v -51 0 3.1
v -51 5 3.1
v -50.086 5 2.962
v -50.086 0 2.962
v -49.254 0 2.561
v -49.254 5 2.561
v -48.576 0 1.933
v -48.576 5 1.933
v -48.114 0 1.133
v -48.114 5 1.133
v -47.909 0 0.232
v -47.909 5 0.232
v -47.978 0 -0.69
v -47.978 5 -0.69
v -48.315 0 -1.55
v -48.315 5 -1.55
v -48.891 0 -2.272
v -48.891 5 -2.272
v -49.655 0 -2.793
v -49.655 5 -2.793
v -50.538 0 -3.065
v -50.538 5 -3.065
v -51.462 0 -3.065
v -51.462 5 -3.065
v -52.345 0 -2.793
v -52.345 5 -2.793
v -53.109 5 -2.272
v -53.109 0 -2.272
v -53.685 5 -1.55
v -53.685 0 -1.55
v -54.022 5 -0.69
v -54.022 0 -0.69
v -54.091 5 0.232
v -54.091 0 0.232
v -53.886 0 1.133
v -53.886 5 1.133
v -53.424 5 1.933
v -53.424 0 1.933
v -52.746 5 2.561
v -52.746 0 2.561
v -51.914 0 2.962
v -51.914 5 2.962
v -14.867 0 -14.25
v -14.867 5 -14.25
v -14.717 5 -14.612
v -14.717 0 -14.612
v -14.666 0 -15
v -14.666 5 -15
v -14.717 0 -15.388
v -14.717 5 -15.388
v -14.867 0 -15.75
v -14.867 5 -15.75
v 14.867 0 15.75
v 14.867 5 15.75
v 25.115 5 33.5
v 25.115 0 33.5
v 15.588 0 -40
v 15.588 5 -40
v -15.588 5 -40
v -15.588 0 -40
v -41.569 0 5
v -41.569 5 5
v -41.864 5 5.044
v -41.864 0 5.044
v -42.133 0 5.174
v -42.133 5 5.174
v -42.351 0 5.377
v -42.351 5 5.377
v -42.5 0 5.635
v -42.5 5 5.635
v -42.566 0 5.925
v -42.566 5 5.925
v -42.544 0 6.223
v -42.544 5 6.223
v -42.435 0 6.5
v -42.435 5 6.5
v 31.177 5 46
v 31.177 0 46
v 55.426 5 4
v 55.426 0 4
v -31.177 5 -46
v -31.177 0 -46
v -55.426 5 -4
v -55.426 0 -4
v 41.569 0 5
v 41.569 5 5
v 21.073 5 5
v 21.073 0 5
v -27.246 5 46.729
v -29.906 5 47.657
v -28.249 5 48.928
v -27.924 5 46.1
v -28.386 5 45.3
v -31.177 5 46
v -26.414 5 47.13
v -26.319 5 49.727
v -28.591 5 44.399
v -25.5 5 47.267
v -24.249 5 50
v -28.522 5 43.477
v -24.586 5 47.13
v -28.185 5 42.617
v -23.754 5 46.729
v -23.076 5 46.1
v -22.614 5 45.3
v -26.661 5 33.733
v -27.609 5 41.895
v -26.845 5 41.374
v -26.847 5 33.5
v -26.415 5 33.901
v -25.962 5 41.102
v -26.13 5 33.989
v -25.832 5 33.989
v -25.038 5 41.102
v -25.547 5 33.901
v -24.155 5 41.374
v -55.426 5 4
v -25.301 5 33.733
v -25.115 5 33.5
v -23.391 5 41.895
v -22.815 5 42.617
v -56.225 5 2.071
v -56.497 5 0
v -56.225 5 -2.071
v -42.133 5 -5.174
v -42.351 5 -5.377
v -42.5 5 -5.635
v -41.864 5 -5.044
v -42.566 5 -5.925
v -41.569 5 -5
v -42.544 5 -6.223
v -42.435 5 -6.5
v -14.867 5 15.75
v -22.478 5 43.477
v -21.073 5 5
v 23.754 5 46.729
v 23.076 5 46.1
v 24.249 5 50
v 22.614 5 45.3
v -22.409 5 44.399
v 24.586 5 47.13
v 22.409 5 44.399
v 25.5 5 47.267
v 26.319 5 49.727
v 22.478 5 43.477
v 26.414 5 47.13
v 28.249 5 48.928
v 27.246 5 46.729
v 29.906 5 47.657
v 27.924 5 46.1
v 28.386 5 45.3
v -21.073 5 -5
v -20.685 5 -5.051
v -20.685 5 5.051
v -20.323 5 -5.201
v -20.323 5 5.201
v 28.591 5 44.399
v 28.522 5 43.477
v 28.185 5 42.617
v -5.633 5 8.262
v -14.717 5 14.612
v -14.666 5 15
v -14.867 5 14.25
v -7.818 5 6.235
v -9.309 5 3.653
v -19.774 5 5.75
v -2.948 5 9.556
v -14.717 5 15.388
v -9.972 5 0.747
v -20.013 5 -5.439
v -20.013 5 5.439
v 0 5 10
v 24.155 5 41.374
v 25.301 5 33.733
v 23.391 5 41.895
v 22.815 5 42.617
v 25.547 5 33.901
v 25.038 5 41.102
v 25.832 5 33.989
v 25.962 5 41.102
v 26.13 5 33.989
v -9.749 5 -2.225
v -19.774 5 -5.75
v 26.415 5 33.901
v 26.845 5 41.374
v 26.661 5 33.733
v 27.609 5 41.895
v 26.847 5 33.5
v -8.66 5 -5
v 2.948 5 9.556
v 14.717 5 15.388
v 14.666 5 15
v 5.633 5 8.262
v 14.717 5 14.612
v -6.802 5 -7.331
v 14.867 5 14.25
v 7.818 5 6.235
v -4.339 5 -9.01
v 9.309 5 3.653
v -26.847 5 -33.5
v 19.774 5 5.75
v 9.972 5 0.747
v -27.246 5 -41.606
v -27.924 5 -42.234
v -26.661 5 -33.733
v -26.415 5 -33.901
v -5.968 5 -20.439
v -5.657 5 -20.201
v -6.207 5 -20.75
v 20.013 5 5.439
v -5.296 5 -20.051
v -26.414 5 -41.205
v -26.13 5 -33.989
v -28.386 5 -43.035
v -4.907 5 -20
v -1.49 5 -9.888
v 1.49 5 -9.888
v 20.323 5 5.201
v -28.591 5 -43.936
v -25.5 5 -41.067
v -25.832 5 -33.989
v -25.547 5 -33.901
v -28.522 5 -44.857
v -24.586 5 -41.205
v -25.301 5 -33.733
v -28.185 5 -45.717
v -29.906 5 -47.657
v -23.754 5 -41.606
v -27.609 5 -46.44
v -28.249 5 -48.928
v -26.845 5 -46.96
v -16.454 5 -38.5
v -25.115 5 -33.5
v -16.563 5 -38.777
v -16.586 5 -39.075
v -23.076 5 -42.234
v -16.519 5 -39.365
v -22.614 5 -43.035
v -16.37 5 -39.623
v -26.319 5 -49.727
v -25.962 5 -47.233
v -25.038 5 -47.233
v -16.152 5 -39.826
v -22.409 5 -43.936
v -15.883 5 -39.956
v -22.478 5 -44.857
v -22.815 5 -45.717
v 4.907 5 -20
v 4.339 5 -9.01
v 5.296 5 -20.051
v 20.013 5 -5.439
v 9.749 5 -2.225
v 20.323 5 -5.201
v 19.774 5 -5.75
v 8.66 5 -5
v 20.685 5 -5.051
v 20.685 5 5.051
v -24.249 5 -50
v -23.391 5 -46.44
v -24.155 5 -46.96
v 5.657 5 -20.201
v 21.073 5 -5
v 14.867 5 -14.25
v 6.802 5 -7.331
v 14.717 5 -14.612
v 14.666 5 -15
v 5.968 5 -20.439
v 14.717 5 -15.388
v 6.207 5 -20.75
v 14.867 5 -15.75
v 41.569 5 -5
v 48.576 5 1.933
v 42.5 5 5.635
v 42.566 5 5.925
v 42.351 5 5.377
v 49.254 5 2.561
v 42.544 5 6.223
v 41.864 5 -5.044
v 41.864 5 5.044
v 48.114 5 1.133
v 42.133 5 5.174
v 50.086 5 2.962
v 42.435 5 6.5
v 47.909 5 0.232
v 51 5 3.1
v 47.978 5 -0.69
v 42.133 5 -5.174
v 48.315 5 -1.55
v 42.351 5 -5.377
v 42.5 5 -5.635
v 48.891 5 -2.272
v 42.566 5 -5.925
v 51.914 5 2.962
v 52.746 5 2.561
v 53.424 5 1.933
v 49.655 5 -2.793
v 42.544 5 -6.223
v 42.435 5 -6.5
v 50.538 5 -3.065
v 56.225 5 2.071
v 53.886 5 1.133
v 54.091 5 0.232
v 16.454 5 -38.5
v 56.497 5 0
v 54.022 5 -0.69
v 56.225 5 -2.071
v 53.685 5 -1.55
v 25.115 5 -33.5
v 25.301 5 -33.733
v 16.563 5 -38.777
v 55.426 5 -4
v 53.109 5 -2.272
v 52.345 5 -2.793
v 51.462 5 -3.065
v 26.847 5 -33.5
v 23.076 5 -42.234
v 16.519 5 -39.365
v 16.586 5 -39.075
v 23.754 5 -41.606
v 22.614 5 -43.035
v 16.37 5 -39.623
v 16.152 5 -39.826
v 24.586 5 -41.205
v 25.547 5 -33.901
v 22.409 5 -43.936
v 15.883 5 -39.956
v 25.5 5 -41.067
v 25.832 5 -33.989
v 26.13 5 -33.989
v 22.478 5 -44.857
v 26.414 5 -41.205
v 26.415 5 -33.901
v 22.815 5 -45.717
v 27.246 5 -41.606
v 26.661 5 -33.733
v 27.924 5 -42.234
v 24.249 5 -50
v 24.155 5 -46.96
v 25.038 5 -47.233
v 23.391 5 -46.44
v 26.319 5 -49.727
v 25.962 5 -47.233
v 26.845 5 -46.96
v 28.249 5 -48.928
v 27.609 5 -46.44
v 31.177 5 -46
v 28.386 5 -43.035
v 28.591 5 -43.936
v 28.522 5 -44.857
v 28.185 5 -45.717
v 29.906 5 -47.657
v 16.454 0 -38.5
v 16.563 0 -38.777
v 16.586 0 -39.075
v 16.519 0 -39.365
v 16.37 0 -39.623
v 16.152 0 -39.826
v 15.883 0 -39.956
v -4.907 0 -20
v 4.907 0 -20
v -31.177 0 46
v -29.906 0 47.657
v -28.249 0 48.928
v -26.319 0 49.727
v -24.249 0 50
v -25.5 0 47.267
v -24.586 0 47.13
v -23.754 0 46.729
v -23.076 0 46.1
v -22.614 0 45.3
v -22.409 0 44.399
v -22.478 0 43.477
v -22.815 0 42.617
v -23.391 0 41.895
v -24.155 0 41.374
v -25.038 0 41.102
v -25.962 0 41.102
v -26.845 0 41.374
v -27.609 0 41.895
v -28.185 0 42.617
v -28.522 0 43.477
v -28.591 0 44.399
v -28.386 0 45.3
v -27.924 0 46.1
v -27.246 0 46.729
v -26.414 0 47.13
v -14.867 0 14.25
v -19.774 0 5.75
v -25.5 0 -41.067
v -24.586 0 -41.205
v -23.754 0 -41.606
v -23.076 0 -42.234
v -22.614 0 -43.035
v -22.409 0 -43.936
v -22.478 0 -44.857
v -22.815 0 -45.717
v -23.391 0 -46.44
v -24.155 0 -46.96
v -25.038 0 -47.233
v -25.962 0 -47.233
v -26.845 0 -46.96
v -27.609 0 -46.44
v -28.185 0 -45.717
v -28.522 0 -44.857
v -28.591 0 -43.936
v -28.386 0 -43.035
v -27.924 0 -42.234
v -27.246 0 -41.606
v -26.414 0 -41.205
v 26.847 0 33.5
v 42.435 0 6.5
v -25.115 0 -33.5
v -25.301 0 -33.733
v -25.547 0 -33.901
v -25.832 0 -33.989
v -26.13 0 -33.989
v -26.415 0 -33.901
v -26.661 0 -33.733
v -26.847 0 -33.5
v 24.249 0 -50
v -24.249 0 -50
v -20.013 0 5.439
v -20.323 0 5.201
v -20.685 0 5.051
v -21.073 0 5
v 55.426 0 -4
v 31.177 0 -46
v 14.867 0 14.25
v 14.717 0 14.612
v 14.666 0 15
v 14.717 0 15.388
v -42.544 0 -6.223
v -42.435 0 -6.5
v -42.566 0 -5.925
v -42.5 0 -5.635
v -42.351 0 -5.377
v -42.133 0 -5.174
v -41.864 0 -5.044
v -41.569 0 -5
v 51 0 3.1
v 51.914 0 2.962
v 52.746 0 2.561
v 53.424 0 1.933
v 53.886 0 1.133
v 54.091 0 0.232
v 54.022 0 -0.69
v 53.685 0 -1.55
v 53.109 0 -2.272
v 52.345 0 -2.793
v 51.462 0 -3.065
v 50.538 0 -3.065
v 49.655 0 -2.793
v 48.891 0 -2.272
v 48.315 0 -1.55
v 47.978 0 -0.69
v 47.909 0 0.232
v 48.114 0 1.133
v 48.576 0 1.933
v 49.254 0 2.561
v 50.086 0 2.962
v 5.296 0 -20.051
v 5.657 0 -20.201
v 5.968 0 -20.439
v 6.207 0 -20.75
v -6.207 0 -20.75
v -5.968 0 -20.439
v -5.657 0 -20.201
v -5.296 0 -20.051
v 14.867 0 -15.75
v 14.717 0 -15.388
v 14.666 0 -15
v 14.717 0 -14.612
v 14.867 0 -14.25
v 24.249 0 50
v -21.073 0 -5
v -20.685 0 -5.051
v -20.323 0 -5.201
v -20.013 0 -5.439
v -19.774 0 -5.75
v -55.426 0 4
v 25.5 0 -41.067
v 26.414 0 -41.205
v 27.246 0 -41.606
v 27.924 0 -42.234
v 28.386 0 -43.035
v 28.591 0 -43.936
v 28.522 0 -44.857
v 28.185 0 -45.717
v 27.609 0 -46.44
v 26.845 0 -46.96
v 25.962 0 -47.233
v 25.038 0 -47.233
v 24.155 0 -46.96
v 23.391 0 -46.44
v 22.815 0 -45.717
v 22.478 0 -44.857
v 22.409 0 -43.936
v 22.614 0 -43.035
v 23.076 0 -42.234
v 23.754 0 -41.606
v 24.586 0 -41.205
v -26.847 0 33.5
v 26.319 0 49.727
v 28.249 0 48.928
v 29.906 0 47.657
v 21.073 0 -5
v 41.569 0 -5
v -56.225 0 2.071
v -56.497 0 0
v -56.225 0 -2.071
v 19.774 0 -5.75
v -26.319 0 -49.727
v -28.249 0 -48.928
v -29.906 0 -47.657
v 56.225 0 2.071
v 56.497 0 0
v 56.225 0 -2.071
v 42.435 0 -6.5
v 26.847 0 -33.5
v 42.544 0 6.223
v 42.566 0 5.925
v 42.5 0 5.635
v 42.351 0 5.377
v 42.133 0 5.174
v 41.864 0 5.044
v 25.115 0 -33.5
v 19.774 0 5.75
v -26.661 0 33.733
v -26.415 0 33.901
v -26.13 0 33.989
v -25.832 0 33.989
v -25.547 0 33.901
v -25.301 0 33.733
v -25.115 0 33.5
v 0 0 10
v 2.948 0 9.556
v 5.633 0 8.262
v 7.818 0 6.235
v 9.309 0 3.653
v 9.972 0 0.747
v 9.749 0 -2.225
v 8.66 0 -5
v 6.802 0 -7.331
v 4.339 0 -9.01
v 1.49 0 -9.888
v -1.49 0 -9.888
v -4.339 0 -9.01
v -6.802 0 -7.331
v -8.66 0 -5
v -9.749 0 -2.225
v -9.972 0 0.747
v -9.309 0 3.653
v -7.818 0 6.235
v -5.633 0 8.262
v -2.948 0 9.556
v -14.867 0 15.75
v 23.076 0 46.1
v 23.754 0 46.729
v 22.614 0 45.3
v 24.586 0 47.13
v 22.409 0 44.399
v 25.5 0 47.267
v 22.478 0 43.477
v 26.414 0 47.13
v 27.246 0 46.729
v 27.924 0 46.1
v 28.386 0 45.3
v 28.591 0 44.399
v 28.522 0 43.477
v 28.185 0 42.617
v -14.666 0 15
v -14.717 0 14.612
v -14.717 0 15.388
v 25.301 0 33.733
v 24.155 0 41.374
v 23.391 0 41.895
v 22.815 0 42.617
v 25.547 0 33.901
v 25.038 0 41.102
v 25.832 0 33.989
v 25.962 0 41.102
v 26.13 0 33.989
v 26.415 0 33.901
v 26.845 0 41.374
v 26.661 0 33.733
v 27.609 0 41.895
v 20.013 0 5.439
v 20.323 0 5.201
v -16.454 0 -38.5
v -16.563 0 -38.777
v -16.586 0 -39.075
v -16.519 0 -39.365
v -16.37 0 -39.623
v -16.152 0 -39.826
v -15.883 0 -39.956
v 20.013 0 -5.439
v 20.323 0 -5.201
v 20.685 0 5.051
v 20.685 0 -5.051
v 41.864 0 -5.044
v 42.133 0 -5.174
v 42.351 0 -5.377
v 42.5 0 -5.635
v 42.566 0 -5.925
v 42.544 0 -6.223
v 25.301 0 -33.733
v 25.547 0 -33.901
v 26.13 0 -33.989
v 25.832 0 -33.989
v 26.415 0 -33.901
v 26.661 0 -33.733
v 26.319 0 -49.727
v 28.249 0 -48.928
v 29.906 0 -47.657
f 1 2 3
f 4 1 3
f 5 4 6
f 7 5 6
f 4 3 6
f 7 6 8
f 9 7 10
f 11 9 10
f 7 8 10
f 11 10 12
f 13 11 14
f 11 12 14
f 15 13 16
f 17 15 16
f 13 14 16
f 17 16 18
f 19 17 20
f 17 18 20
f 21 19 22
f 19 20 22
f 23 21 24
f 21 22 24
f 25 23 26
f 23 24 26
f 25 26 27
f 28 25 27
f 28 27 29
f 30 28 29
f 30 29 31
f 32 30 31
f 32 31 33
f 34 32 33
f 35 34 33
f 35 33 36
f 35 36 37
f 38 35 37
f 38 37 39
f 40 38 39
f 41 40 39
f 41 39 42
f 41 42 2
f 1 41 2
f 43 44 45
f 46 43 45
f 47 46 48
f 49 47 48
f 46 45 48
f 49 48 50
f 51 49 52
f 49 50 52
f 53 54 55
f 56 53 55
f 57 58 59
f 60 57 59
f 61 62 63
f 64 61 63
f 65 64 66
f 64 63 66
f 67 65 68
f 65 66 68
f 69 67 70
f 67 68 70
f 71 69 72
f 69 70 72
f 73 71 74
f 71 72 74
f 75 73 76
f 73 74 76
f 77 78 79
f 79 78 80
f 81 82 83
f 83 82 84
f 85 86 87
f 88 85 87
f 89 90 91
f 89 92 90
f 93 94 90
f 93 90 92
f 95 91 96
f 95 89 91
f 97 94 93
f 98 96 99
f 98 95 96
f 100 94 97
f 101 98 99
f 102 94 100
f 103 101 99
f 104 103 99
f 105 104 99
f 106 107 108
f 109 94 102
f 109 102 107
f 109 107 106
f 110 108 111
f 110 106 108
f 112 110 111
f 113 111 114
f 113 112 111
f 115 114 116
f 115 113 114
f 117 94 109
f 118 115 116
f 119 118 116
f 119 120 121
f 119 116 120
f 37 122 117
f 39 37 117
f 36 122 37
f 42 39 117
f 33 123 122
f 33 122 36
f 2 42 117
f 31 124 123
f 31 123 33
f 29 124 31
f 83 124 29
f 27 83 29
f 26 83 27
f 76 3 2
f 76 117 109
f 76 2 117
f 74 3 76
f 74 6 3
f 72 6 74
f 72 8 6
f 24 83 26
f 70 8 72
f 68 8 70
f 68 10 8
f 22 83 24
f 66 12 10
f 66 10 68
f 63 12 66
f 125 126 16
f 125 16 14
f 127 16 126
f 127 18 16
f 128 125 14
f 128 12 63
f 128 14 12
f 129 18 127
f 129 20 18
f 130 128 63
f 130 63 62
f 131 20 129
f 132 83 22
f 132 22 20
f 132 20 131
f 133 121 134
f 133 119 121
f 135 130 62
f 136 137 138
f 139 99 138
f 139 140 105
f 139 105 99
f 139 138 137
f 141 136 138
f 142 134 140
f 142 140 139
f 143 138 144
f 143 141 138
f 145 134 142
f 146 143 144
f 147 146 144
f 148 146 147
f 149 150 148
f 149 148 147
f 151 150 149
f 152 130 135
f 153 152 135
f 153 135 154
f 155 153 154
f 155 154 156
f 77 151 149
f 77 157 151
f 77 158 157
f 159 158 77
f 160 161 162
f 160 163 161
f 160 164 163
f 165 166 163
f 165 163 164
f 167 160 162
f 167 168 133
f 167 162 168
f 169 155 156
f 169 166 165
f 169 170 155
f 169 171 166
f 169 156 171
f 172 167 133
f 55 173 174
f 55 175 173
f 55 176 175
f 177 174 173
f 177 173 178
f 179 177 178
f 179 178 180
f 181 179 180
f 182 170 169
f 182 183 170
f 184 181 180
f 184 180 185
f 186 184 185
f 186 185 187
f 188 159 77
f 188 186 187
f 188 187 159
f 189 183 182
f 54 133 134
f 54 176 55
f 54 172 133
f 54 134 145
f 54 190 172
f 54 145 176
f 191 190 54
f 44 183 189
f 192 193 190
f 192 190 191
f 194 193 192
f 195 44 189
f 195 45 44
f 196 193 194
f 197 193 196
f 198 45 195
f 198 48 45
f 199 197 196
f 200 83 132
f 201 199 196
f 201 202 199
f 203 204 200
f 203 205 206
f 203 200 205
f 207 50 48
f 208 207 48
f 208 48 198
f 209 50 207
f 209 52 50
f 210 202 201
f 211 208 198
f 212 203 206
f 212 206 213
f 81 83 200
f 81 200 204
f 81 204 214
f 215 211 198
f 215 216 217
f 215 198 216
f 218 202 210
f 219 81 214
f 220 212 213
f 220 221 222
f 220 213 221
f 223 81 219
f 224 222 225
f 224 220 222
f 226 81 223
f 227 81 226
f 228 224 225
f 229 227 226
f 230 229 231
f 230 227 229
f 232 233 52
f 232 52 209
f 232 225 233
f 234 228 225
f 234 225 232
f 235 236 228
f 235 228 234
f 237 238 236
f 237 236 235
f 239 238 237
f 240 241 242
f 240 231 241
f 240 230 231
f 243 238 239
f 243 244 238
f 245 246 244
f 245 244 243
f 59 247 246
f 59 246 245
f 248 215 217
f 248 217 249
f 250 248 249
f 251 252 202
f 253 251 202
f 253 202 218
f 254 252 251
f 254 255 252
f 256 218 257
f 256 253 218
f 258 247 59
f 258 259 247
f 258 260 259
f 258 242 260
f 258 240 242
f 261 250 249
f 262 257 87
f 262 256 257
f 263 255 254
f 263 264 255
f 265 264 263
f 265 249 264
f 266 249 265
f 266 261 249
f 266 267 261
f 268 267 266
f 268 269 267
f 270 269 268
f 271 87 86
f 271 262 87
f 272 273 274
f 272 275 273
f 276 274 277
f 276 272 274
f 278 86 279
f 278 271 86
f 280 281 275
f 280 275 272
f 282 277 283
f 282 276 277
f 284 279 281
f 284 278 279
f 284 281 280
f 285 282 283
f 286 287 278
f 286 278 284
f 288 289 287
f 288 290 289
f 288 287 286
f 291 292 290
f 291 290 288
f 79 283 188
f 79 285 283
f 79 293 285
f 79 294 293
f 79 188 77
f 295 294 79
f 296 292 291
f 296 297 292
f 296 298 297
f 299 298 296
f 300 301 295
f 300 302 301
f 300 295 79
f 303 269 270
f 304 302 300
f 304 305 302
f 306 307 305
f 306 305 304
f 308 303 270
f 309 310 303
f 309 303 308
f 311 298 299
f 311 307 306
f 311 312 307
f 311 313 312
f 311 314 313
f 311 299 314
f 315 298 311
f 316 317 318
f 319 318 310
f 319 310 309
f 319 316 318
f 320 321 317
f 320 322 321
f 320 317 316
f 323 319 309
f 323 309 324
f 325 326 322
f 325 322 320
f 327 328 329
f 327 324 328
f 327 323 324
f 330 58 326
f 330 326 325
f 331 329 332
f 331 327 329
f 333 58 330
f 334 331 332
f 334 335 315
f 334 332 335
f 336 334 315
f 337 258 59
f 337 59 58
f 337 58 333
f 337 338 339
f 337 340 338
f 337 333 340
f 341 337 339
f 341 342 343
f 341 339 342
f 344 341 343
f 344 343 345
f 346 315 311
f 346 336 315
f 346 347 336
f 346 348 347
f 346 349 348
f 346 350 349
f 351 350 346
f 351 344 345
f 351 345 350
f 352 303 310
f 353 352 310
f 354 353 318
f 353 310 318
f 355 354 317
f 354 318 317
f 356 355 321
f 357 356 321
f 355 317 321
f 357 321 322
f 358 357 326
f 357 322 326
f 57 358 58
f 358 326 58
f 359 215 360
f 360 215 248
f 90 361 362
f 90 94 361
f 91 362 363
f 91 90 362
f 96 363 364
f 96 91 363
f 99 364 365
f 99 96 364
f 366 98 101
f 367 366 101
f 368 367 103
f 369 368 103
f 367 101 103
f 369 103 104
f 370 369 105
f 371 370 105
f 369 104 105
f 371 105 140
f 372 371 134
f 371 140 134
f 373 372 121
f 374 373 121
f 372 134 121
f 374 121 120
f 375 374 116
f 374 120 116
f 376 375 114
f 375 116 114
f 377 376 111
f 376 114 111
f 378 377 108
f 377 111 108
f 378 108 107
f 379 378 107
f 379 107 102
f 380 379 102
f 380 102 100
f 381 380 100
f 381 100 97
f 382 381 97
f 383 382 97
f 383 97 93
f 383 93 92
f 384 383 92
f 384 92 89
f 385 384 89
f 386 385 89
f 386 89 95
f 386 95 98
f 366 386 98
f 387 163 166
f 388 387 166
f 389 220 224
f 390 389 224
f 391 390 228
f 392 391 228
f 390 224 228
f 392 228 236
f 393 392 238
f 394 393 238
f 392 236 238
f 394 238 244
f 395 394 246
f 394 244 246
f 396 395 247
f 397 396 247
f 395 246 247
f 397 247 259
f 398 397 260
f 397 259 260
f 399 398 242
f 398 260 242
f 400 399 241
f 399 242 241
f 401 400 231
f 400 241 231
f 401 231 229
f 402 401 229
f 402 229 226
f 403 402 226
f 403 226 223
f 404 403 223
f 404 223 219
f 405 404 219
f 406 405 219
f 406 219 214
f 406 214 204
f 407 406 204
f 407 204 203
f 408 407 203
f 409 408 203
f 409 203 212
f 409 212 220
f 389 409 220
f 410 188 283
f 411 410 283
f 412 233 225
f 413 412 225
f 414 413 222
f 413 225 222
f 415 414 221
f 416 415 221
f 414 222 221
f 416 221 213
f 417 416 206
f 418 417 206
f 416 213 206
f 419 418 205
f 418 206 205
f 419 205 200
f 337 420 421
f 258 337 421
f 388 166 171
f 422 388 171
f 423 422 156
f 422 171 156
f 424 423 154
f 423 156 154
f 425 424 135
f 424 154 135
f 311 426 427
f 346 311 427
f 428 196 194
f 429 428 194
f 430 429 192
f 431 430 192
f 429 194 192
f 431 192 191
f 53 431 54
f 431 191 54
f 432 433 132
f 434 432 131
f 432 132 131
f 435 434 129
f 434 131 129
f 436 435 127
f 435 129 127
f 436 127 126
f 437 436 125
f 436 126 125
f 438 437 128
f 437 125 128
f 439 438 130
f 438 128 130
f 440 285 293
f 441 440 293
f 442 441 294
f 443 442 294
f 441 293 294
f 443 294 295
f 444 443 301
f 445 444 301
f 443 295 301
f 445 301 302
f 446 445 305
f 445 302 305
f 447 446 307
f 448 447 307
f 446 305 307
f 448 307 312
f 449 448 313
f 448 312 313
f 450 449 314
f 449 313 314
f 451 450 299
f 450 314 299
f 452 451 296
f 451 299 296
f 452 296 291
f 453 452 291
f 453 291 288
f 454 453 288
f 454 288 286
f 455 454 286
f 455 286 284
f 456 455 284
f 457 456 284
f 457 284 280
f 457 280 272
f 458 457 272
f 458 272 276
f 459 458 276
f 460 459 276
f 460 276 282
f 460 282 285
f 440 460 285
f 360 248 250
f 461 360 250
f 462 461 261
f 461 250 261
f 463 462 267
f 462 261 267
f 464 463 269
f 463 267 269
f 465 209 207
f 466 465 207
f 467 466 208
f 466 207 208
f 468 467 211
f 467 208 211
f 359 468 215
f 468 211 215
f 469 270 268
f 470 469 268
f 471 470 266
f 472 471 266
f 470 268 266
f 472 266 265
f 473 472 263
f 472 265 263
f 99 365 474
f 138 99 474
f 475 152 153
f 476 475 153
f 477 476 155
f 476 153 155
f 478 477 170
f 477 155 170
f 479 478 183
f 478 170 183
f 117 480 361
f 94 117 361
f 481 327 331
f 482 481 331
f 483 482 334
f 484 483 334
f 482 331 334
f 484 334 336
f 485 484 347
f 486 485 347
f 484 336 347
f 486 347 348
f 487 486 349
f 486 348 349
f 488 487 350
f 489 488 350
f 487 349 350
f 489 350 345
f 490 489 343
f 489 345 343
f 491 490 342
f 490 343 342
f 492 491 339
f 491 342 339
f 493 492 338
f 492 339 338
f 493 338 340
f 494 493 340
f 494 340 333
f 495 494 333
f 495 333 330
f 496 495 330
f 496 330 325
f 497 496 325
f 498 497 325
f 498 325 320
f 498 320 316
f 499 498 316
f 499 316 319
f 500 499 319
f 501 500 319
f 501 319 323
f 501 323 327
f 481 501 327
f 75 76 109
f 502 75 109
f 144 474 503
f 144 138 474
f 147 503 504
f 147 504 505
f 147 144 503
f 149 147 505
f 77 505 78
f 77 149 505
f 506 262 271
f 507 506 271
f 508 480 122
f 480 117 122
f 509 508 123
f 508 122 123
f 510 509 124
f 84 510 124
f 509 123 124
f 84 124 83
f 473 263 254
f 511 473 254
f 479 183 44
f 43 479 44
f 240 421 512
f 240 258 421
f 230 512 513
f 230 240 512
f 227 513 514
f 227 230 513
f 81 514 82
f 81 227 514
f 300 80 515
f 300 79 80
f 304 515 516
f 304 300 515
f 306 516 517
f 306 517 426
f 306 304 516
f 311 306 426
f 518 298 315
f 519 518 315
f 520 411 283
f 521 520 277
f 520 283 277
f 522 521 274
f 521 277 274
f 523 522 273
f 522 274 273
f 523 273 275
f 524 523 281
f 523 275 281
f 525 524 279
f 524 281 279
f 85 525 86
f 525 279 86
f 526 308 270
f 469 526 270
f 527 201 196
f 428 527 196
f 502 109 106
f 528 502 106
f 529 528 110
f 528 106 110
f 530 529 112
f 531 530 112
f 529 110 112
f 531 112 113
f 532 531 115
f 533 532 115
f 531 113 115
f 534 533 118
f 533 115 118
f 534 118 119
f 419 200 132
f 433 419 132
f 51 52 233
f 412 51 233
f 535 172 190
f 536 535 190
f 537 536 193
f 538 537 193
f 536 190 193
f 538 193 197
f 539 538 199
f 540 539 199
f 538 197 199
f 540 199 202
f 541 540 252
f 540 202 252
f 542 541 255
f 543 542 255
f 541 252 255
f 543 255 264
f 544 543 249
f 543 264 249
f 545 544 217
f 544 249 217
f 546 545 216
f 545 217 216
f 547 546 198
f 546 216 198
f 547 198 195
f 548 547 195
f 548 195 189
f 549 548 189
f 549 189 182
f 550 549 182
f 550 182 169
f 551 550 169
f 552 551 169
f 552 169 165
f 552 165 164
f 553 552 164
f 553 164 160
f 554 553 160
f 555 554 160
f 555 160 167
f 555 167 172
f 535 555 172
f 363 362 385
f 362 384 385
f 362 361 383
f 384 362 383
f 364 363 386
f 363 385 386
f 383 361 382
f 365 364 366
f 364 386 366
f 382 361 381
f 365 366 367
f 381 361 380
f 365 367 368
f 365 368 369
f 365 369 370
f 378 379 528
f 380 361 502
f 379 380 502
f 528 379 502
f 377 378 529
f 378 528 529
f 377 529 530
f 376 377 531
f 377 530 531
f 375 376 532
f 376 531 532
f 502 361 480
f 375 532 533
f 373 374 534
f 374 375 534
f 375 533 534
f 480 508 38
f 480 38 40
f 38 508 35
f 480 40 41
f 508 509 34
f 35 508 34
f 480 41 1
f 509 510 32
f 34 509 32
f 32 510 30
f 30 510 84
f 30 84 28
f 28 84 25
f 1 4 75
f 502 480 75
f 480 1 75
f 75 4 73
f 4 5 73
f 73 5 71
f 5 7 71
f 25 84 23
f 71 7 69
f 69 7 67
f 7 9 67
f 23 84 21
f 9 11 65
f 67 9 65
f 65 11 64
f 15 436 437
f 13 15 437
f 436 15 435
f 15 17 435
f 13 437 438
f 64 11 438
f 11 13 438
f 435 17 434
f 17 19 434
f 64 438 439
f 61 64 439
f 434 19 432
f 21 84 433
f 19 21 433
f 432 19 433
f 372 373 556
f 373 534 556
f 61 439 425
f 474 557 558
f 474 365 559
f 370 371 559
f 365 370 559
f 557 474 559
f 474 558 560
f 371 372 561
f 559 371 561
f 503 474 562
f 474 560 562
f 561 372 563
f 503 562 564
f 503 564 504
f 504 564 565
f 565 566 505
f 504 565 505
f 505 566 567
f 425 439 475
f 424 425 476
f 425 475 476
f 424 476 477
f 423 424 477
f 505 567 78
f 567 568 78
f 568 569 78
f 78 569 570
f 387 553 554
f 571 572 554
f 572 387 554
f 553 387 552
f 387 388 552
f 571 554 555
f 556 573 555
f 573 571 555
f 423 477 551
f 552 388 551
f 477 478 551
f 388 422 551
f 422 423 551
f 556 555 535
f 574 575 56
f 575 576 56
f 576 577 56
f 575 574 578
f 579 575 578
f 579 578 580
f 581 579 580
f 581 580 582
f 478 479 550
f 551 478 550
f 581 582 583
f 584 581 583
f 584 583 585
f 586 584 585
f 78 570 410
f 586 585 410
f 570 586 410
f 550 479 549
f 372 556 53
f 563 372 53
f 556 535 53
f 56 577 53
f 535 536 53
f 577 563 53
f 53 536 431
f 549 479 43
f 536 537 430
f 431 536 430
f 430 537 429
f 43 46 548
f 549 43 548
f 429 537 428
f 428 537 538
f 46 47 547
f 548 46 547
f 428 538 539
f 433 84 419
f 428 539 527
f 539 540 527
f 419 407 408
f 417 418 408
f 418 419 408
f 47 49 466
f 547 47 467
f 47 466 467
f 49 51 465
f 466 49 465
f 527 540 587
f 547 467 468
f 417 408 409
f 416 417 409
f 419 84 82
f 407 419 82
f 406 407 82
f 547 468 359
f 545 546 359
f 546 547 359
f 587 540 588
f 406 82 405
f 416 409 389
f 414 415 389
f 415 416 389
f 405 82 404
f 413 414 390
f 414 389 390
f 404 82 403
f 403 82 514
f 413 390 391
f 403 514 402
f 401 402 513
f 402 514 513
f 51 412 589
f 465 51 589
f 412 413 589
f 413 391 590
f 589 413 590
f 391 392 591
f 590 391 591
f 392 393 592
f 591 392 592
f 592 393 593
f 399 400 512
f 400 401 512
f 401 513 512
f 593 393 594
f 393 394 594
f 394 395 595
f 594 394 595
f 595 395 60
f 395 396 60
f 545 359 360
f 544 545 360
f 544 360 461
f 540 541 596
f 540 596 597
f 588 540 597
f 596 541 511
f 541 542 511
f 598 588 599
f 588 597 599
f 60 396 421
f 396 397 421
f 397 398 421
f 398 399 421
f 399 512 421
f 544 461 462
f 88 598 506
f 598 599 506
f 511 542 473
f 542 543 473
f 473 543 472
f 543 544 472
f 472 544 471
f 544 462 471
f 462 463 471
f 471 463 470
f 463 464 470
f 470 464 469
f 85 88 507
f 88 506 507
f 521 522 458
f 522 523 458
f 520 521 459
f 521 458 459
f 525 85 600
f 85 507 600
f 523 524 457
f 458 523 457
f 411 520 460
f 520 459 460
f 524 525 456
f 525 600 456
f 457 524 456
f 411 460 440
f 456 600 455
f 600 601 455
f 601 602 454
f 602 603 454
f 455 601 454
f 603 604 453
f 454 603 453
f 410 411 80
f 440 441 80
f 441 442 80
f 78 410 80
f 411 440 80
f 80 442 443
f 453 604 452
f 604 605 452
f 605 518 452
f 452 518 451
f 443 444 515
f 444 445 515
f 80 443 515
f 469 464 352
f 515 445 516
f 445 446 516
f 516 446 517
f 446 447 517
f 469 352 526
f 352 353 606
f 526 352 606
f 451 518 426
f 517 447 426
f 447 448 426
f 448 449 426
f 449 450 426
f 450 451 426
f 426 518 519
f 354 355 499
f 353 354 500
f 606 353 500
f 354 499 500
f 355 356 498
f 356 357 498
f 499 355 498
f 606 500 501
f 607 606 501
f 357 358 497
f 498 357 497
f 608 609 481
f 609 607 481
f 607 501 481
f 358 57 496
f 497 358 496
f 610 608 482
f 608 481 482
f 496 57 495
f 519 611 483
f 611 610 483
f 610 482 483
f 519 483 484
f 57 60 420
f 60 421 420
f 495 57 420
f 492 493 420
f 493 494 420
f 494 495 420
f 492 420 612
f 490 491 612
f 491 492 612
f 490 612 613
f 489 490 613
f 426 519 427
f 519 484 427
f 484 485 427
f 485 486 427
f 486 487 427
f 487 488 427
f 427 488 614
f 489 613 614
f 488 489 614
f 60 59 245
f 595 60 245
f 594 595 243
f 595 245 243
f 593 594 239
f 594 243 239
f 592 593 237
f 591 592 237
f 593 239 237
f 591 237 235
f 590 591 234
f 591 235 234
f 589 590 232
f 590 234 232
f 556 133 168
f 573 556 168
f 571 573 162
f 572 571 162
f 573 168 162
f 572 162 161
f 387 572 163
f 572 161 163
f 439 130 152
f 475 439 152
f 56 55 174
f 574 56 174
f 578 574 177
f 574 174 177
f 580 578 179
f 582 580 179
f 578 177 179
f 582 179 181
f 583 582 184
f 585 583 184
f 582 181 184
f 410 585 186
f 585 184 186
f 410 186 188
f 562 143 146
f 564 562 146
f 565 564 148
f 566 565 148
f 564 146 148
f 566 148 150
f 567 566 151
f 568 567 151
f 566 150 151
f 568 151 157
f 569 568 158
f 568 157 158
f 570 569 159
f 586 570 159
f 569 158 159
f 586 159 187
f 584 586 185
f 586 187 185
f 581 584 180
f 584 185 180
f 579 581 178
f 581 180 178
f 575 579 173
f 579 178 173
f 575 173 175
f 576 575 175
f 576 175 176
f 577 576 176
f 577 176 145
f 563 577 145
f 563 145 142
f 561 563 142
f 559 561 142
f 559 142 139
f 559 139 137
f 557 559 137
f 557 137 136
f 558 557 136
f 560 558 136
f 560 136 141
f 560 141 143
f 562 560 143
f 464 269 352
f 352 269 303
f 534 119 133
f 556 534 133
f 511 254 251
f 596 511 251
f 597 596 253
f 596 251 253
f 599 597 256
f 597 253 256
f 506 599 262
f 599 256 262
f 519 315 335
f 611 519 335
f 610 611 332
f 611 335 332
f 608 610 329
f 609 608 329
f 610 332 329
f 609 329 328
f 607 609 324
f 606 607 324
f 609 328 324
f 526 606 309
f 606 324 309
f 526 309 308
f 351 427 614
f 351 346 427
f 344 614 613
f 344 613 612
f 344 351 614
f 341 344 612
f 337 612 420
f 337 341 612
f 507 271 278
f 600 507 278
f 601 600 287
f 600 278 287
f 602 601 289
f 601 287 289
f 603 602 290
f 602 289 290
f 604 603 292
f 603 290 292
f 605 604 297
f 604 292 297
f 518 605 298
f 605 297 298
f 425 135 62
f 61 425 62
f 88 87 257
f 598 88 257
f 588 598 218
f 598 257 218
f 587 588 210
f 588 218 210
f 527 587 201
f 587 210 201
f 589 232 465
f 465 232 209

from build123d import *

# Parameters (mm, degrees)
BOSS_EXTRUDE1_DEPTH = 5
FILLET1_R           = 8
SKETCH2_R           = 10
SKETCH2_R_2         = 3.1
CUT_EXTRUDE1_DEPTH  = 10


with BuildPart() as part:
    # Sketch1 → Boss-Extrude1 (new body)
    with BuildSketch(Plane(origin=(0, 0, 0), x_dir=(1, 0, 0), z_dir=(0, 1, 0))):
        Polygon((-57.735026919, 0), (-28.867513459, -50), (28.867513459, -50), (57.735026919, 0), (28.867513459, 50), (-28.867513459, 50), align=None)
    extrude(amount=BOSS_EXTRUDE1_DEPTH)

    # Fillet1
    fillet1_edges = [part.edges().sort_by_distance(p)[0] for p in [
        (-28.867513459, 2.5, -50),
        (28.867513459, 2.5, -50),
        (57.735026919, 2.5, 0),
        (28.867513459, 2.5, 50),
        (-28.867513459, 2.5, 50),
        (-57.735026919, 2.5, 0),
    ]]
    fillet(fillet1_edges, radius=FILLET1_R)

    # Sketch2 → Cut-Extrude1 (cut)
    with BuildSketch(Plane(origin=(0, 5, 0), x_dir=(1, 0, 0), z_dir=(0, 1, 0))):
        with Locations(Location((0, 0, 0), (0, 0, 270))):
            Circle(SKETCH2_R)
        with Locations(Location((-25.5, 44.167295593, 0), (0, 0, 270))):
            Circle(SKETCH2_R_2)
        with Locations(Location((25.5, 44.167295593, 0), (0, 0, 270))):
            Circle(SKETCH2_R_2)
        with Locations(Location((51, 0, 0), (0, 0, 270))):
            Circle(SKETCH2_R_2)
        with Locations(Location((25.5, -44.167295593, 0), (0, 0, 270))):
            Circle(SKETCH2_R_2)
        with Locations(Location((-25.5, -44.167295593, 0), (0, 0, 270))):
            Circle(SKETCH2_R_2)
        with Locations(Location((-51, 0, 0), (0, 0, 270))):
            Circle(SKETCH2_R_2)
        with BuildLine():
            Line((6.206515394, 20.75), (16.454482672, 38.5))
            ThreePointArc((16.454482672, 38.5), (16.454482672, 39.5), (15.588457268, 40))
            Line((15.588457268, 40), (-15.588457268, 40))
            ThreePointArc((-15.588457268, 40), (-16.454482672, 39.5), (-16.454482672, 38.5))
            Line((-16.454482672, 38.5), (-6.206515394, 20.75))
            ThreePointArc((-6.206515394, 20.75), (-5.657477288, 20.200961894), (-4.907477288, 20))
            Line((-4.907477288, 20), (4.907477288, 20))
            ThreePointArc((4.907477288, 20), (5.657477288, 20.200961894), (6.206515394, 20.75))
        make_face()
        with BuildLine():
            Line((21.073284825, 5), (41.569219382, 5))
            ThreePointArc((41.569219382, 5), (42.435244785, 5.5), (42.435244785, 6.5))
            Line((42.435244785, 6.5), (26.846787517, 33.5))
            ThreePointArc((26.846787517, 33.5), (25.980762114, 34), (25.11473671, 33.5))
            Line((25.11473671, 33.5), (14.866769432, 15.75))
            ThreePointArc((14.866769432, 15.75), (14.665807537, 15), (14.866769432, 14.25))
            Line((14.866769432, 14.25), (19.77424672, 5.75))
            ThreePointArc((19.77424672, 5.75), (20.323284825, 5.200961894), (21.073284825, 5))
        make_face()
        with BuildLine():
            Line((14.866769432, -15.75), (25.11473671, -33.5))
            ThreePointArc((25.11473671, -33.5), (25.980762114, -34), (26.846787517, -33.5))
            Line((26.846787517, -33.5), (42.435244785, -6.5))
            ThreePointArc((42.435244785, -6.5), (42.435244785, -5.5), (41.569219382, -5))
            Line((41.569219382, -5), (21.073284825, -5))
            ThreePointArc((21.073284825, -5), (20.323284825, -5.200961894), (19.77424672, -5.75))
            Line((19.77424672, -5.75), (14.866769432, -14.25))
            ThreePointArc((14.866769432, -14.25), (14.665807537, -15), (14.866769432, -15.75))
        make_face()
        with BuildLine():
            Line((-21.073284825, -5), (-41.569219382, -5))
            ThreePointArc((-41.569219382, -5), (-42.435244785, -5.5), (-42.435244785, -6.5))
            Line((-42.435244785, -6.5), (-26.846787517, -33.5))
            ThreePointArc((-26.846787517, -33.5), (-25.980762114, -34), (-25.11473671, -33.5))
            Line((-25.11473671, -33.5), (-14.866769432, -15.75))
            ThreePointArc((-14.866769432, -15.75), (-14.665807537, -15), (-14.866769432, -14.25))
            Line((-14.866769432, -14.25), (-19.77424672, -5.75))
            ThreePointArc((-19.77424672, -5.75), (-20.323284825, -5.200961894), (-21.073284825, -5))
        make_face()
        with BuildLine():
            Line((-14.866769432, 15.75), (-25.11473671, 33.5))
            ThreePointArc((-25.11473671, 33.5), (-25.980762114, 34), (-26.846787517, 33.5))
            Line((-26.846787517, 33.5), (-42.435244785, 6.5))
            ThreePointArc((-42.435244785, 6.5), (-42.435244785, 5.5), (-41.569219382, 5))
            Line((-41.569219382, 5), (-21.073284825, 5))
            ThreePointArc((-21.073284825, 5), (-20.323284825, 5.200961894), (-19.77424672, 5.75))
            Line((-19.77424672, 5.75), (-14.866769432, 14.25))
            ThreePointArc((-14.866769432, 14.25), (-14.665807537, 15), (-14.866769432, 15.75))
        make_face()
    extrude(amount=-CUT_EXTRUDE1_DEPTH, mode=Mode.SUBTRACT)


solid = part.part
